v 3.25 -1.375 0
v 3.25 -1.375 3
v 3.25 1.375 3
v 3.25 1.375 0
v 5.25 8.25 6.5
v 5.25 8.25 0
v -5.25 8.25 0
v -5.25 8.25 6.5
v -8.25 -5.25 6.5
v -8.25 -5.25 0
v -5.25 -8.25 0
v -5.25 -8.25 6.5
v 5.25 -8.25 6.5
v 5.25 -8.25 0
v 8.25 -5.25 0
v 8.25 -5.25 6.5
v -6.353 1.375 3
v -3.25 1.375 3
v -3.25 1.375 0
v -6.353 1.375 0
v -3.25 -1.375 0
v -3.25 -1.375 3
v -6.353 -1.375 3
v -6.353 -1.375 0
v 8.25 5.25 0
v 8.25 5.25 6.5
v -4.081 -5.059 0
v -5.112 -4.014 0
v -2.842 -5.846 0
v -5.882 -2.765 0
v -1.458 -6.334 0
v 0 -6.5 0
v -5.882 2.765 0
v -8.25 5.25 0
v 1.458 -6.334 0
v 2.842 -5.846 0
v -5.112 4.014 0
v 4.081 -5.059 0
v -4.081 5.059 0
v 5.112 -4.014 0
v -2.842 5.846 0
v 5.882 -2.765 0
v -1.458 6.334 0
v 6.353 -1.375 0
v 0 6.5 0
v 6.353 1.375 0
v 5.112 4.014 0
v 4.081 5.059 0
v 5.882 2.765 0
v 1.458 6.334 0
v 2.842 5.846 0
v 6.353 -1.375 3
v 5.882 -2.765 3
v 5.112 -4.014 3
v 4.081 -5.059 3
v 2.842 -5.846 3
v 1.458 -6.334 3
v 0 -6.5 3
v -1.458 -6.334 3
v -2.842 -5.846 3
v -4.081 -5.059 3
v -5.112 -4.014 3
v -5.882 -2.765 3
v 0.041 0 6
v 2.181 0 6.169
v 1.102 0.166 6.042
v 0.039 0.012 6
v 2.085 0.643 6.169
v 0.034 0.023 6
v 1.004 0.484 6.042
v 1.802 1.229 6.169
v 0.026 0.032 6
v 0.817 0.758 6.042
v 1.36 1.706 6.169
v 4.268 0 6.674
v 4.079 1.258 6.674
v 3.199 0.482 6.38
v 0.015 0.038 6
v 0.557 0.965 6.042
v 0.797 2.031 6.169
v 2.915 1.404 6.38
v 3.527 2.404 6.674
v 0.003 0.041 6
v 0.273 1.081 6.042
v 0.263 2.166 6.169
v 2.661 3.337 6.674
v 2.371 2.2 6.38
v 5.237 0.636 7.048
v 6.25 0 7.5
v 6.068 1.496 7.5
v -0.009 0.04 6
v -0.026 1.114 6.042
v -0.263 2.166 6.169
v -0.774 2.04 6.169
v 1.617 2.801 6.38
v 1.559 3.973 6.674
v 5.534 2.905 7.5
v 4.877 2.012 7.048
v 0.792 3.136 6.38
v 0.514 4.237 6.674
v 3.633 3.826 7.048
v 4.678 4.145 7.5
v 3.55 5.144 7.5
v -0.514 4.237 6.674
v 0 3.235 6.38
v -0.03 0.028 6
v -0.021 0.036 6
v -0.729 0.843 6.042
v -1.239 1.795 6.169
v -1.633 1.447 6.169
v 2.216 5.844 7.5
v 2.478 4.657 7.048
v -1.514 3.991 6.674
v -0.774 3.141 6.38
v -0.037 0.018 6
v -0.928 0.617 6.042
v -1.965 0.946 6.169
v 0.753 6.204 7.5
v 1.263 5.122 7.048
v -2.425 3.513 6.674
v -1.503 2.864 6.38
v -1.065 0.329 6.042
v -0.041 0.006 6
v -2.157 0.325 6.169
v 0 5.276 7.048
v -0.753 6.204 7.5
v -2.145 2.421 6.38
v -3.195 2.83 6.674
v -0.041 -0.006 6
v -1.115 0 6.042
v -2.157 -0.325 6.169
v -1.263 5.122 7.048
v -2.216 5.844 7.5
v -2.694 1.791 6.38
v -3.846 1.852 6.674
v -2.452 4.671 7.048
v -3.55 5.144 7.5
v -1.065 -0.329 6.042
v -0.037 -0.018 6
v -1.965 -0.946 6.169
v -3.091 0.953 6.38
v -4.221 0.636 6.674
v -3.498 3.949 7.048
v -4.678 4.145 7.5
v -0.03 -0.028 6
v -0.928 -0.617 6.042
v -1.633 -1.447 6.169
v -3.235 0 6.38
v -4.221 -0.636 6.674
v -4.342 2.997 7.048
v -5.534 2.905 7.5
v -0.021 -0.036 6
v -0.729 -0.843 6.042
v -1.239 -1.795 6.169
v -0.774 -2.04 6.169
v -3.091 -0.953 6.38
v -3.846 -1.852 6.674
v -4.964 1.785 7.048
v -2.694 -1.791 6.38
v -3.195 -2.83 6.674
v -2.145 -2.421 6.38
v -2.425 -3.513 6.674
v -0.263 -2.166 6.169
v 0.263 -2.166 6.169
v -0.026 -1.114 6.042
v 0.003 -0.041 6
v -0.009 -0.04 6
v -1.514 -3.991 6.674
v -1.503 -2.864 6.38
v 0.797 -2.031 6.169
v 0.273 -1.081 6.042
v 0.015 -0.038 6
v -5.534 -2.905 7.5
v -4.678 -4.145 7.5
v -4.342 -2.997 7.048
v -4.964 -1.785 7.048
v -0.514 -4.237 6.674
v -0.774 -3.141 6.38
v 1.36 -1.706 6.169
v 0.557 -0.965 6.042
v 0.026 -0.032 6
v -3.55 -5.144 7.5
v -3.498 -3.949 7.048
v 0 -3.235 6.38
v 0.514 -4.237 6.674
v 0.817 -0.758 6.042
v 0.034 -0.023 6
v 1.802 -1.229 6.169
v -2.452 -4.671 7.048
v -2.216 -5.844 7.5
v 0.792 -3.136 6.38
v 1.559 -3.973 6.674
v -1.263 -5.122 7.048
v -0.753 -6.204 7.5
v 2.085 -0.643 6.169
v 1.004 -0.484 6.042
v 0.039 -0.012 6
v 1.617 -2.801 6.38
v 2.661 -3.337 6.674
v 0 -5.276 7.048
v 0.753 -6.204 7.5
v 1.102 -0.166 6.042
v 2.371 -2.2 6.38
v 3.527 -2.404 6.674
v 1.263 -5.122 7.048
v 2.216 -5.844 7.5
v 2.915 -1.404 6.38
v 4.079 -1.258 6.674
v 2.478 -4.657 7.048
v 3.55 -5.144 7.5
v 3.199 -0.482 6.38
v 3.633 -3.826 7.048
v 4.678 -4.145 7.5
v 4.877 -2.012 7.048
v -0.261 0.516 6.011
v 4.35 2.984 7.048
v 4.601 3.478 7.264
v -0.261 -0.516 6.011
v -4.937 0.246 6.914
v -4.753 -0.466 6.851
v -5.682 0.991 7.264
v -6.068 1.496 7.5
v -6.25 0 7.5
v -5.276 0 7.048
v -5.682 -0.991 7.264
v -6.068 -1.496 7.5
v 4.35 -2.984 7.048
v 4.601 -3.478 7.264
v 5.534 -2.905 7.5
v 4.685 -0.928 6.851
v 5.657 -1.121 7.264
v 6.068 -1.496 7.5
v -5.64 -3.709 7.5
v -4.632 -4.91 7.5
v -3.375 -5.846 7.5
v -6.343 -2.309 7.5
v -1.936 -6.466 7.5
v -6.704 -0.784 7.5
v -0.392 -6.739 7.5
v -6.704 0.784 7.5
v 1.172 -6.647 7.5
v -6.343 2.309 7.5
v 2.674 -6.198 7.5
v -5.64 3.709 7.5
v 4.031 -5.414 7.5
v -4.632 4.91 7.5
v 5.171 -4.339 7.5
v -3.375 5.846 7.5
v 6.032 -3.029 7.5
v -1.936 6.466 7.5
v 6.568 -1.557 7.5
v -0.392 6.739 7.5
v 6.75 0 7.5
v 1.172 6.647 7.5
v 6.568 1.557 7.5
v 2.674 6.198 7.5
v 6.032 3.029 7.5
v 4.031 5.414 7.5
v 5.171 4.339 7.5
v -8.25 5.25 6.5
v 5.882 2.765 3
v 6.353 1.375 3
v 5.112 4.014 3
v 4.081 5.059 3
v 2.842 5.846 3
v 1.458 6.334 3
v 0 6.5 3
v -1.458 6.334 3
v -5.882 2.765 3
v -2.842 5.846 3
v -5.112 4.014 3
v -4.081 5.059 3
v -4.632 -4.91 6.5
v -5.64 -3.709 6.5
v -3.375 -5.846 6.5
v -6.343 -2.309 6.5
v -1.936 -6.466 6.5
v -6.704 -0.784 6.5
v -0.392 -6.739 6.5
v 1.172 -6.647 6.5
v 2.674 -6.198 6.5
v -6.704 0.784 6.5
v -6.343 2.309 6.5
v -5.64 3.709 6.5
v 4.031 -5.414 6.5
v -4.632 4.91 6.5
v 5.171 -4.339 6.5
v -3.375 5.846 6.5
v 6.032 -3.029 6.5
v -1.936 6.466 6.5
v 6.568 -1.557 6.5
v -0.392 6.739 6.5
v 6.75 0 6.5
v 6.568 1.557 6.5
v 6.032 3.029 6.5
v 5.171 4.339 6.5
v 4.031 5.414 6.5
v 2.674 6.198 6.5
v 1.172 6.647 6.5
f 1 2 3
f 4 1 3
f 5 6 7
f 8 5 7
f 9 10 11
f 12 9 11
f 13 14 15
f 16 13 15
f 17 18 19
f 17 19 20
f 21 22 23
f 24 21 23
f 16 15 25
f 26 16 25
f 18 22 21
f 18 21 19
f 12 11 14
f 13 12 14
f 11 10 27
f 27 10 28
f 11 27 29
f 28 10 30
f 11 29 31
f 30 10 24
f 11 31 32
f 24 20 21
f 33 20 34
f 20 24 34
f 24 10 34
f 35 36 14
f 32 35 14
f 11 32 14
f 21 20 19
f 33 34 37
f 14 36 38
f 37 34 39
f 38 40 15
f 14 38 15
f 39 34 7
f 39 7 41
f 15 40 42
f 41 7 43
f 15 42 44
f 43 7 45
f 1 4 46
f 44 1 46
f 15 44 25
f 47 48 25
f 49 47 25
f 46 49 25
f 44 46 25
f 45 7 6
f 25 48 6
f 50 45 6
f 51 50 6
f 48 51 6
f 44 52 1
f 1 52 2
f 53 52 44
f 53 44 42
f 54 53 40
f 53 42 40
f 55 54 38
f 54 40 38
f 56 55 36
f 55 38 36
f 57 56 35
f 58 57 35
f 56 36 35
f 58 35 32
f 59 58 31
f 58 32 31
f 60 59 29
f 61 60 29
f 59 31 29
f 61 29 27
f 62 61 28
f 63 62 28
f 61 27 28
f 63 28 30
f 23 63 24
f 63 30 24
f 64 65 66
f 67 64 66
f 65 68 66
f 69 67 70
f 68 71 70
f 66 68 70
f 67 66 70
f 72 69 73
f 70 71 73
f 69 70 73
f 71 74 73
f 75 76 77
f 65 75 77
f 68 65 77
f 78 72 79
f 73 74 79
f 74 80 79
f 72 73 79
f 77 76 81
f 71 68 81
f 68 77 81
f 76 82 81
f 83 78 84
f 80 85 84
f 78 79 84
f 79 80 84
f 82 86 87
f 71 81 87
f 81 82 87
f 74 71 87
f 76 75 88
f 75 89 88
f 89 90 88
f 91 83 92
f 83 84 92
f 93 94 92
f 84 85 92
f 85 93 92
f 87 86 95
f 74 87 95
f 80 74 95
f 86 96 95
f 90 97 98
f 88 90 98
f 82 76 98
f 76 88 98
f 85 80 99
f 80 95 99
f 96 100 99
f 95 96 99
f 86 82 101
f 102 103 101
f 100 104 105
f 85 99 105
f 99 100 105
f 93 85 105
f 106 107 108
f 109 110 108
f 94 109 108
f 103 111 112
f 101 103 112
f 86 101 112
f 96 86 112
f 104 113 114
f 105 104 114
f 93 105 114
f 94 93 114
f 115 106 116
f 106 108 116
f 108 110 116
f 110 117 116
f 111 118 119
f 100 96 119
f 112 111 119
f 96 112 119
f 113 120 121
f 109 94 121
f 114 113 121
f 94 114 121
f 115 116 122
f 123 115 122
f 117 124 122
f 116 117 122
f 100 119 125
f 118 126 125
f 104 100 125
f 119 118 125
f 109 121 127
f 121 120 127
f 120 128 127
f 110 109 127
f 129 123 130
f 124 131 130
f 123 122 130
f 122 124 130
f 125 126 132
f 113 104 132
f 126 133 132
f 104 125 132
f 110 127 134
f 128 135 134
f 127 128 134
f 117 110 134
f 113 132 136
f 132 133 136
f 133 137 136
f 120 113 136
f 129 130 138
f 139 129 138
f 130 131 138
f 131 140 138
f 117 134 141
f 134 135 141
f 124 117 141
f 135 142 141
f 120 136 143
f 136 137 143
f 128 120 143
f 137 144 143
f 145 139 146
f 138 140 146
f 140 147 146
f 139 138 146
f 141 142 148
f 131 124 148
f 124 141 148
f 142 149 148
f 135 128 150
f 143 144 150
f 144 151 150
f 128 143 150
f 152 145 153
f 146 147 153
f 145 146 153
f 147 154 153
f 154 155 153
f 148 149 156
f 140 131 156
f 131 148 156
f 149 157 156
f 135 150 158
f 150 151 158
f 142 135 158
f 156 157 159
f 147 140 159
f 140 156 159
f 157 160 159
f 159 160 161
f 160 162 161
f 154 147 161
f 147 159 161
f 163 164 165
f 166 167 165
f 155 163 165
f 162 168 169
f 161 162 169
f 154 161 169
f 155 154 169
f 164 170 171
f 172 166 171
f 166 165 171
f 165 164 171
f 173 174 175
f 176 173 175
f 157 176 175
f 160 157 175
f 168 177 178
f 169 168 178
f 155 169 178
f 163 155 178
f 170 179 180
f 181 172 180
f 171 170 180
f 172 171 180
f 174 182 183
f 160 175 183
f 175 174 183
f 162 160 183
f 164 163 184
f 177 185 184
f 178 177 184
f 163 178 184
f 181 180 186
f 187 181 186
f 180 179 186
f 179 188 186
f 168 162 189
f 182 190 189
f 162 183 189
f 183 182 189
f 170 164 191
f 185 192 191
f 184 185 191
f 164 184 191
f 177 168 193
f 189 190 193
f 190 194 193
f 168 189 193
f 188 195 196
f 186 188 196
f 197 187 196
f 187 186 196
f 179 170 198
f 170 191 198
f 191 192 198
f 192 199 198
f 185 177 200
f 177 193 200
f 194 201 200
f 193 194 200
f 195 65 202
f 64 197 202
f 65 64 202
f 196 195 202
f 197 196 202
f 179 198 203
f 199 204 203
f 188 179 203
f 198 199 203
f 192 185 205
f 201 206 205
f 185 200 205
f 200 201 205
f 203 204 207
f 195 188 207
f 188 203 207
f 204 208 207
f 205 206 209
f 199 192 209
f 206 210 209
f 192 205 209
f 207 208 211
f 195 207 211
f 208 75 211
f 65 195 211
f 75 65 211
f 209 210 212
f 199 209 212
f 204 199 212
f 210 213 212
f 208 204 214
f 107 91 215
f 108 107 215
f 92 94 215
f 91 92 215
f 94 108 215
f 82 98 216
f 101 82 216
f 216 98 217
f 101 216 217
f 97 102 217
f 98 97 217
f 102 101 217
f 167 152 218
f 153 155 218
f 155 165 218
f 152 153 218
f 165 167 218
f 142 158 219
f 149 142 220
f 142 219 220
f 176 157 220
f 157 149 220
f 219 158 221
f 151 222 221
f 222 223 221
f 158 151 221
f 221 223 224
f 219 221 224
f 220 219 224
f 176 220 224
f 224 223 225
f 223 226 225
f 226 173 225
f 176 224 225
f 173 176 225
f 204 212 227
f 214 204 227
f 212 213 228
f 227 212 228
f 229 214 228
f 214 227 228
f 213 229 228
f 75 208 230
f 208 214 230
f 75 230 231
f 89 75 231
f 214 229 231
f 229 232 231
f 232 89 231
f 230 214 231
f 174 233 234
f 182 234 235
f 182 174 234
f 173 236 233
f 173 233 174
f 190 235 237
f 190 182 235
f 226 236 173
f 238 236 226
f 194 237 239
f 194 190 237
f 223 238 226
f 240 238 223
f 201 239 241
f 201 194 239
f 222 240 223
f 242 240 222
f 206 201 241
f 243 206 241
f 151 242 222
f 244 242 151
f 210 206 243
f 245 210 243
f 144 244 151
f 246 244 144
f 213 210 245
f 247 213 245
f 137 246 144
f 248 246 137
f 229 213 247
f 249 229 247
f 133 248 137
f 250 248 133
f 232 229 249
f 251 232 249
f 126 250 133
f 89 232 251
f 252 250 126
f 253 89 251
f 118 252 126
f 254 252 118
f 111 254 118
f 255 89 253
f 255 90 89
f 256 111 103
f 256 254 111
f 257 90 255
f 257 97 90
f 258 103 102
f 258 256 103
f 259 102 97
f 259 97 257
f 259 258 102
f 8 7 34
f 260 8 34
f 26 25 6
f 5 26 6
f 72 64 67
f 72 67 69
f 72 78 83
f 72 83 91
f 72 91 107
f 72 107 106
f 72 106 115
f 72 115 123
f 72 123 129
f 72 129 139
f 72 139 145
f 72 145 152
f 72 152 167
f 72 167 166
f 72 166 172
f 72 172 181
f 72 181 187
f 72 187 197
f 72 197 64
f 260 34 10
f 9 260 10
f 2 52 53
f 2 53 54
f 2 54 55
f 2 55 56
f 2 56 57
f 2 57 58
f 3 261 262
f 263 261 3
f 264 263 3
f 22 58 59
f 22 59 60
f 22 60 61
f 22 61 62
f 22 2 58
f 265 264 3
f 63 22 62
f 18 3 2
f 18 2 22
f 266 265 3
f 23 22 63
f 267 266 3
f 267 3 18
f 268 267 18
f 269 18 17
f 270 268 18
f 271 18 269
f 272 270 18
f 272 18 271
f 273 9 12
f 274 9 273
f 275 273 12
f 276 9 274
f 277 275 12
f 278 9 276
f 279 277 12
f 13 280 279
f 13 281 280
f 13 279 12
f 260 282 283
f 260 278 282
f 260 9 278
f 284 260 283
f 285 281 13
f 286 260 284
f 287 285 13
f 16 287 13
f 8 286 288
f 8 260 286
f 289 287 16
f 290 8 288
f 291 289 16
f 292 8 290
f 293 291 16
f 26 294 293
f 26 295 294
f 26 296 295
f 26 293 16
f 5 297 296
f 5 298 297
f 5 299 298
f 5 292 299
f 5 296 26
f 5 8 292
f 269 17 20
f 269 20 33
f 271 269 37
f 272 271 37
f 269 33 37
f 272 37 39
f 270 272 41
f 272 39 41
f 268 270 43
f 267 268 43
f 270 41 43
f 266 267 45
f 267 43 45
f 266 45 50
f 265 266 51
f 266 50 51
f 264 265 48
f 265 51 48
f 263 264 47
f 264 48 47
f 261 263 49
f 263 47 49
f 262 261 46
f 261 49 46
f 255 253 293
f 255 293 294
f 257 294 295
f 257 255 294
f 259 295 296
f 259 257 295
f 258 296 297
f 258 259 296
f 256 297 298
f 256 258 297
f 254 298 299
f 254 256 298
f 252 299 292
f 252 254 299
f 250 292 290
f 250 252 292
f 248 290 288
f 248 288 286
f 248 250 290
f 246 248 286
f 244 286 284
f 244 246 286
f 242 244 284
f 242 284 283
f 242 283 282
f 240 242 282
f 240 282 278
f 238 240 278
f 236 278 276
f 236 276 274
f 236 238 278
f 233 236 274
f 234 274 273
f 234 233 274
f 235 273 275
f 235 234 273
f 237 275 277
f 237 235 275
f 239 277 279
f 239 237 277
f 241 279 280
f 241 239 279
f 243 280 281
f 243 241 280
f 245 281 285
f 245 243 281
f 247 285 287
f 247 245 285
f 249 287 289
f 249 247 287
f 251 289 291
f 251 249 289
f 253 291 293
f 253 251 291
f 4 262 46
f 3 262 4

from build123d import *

# Parameters (mm, degrees)
BOSS_EXTRUDE2_DEPTH = 6.5
SKETCH2_R           = 6.25
CUT_EXTRUDE1_DEPTH  = 0.5
BOSS_EXTRUDE6_START = 1
SKETCH8_R           = 6.75
SKETCH8_R_2         = 6.25
BOSS_EXTRUDE6_DEPTH = 1
FILLET5_R           = 13.6
SKETCH3_R           = 6.5
CUT_EXTRUDE2_DEPTH  = 3
SKETCH9_W           = 3.957503607
SKETCH9_H           = 2.75
BOSS_EXTRUDE7_DEPTH = 3


with BuildPart() as part:
    # Sketch1 → Boss-Extrude2 (new body)
    with BuildSketch(Plane.XY):
        Polygon((-8.25, -5.25), (-5.25, -8.25), (5.25, -8.25), (8.25, -5.25), (8.25, 5.25), (5.25, 8.25), (-5.25, 8.25), (-8.25, 5.25), align=None)
    extrude(amount=BOSS_EXTRUDE2_DEPTH)

    # Sketch2 → Cut-Extrude1 (cut)
    with BuildSketch(Plane.XY.offset(6.5)):
        Circle(SKETCH2_R)
    extrude(amount=-CUT_EXTRUDE1_DEPTH, mode=Mode.SUBTRACT)

    # Sketch8 → Boss-Extrude6 (add)
    with BuildSketch(Plane.XY.offset(6.5).offset(BOSS_EXTRUDE6_START)):
        Circle(SKETCH8_R)
        Circle(SKETCH8_R_2, mode=Mode.SUBTRACT)
    extrude(amount=-BOSS_EXTRUDE6_DEPTH)

    # Fillet5
    # the kernel refuses this fillet: 13.6 mm, written as the material it adds along each edge
    with BuildSketch(Plane(origin=(0, 0, 6), x_dir=(1, 0, 0), z_dir=(0, -1, 0))) as fillet5_piece_1:
        with BuildLine():
            CenterArc((0.041135369, 13.6), FILLET5_R, 270, 27.163688564)
            Line((0.041135369, 0), (0.041135369, -0.272))
            Line((0.041135369, -0.272), (6.25, -0.272))
            Line((6.25, -0.272), (6.522, 0))
            ThreePointArc((6.522, 0), (6.522, 0.75), (6.374177293, 1.258))
            Line((6.374177293, 1.258), (6.25, 1.5))
        make_face()
    revolve(axis=Axis((0, 0, 6), (0, 0, 1)))

    # Sketch3 → Cut-Extrude2 (cut)
    with BuildSketch(Plane(origin=(0, 0, 0), x_dir=(-1, 0, 0), z_dir=(0, 0, -1))):
        Circle(SKETCH3_R)
    extrude(amount=-CUT_EXTRUDE2_DEPTH, mode=Mode.SUBTRACT)

    # Sketch9 → Boss-Extrude7 (add)
    with BuildSketch(Plane(origin=(0, 0, 3), x_dir=(-1, 0, 0), z_dir=(0, 0, -1))):
        with Locations((-5.228751803, 0)):
            Rectangle(SKETCH9_W, SKETCH9_H)
        with Locations((5.228751803, 0)):
            Rectangle(SKETCH9_W, SKETCH9_H)
    extrude(amount=BOSS_EXTRUDE7_DEPTH)


solid = part.part
